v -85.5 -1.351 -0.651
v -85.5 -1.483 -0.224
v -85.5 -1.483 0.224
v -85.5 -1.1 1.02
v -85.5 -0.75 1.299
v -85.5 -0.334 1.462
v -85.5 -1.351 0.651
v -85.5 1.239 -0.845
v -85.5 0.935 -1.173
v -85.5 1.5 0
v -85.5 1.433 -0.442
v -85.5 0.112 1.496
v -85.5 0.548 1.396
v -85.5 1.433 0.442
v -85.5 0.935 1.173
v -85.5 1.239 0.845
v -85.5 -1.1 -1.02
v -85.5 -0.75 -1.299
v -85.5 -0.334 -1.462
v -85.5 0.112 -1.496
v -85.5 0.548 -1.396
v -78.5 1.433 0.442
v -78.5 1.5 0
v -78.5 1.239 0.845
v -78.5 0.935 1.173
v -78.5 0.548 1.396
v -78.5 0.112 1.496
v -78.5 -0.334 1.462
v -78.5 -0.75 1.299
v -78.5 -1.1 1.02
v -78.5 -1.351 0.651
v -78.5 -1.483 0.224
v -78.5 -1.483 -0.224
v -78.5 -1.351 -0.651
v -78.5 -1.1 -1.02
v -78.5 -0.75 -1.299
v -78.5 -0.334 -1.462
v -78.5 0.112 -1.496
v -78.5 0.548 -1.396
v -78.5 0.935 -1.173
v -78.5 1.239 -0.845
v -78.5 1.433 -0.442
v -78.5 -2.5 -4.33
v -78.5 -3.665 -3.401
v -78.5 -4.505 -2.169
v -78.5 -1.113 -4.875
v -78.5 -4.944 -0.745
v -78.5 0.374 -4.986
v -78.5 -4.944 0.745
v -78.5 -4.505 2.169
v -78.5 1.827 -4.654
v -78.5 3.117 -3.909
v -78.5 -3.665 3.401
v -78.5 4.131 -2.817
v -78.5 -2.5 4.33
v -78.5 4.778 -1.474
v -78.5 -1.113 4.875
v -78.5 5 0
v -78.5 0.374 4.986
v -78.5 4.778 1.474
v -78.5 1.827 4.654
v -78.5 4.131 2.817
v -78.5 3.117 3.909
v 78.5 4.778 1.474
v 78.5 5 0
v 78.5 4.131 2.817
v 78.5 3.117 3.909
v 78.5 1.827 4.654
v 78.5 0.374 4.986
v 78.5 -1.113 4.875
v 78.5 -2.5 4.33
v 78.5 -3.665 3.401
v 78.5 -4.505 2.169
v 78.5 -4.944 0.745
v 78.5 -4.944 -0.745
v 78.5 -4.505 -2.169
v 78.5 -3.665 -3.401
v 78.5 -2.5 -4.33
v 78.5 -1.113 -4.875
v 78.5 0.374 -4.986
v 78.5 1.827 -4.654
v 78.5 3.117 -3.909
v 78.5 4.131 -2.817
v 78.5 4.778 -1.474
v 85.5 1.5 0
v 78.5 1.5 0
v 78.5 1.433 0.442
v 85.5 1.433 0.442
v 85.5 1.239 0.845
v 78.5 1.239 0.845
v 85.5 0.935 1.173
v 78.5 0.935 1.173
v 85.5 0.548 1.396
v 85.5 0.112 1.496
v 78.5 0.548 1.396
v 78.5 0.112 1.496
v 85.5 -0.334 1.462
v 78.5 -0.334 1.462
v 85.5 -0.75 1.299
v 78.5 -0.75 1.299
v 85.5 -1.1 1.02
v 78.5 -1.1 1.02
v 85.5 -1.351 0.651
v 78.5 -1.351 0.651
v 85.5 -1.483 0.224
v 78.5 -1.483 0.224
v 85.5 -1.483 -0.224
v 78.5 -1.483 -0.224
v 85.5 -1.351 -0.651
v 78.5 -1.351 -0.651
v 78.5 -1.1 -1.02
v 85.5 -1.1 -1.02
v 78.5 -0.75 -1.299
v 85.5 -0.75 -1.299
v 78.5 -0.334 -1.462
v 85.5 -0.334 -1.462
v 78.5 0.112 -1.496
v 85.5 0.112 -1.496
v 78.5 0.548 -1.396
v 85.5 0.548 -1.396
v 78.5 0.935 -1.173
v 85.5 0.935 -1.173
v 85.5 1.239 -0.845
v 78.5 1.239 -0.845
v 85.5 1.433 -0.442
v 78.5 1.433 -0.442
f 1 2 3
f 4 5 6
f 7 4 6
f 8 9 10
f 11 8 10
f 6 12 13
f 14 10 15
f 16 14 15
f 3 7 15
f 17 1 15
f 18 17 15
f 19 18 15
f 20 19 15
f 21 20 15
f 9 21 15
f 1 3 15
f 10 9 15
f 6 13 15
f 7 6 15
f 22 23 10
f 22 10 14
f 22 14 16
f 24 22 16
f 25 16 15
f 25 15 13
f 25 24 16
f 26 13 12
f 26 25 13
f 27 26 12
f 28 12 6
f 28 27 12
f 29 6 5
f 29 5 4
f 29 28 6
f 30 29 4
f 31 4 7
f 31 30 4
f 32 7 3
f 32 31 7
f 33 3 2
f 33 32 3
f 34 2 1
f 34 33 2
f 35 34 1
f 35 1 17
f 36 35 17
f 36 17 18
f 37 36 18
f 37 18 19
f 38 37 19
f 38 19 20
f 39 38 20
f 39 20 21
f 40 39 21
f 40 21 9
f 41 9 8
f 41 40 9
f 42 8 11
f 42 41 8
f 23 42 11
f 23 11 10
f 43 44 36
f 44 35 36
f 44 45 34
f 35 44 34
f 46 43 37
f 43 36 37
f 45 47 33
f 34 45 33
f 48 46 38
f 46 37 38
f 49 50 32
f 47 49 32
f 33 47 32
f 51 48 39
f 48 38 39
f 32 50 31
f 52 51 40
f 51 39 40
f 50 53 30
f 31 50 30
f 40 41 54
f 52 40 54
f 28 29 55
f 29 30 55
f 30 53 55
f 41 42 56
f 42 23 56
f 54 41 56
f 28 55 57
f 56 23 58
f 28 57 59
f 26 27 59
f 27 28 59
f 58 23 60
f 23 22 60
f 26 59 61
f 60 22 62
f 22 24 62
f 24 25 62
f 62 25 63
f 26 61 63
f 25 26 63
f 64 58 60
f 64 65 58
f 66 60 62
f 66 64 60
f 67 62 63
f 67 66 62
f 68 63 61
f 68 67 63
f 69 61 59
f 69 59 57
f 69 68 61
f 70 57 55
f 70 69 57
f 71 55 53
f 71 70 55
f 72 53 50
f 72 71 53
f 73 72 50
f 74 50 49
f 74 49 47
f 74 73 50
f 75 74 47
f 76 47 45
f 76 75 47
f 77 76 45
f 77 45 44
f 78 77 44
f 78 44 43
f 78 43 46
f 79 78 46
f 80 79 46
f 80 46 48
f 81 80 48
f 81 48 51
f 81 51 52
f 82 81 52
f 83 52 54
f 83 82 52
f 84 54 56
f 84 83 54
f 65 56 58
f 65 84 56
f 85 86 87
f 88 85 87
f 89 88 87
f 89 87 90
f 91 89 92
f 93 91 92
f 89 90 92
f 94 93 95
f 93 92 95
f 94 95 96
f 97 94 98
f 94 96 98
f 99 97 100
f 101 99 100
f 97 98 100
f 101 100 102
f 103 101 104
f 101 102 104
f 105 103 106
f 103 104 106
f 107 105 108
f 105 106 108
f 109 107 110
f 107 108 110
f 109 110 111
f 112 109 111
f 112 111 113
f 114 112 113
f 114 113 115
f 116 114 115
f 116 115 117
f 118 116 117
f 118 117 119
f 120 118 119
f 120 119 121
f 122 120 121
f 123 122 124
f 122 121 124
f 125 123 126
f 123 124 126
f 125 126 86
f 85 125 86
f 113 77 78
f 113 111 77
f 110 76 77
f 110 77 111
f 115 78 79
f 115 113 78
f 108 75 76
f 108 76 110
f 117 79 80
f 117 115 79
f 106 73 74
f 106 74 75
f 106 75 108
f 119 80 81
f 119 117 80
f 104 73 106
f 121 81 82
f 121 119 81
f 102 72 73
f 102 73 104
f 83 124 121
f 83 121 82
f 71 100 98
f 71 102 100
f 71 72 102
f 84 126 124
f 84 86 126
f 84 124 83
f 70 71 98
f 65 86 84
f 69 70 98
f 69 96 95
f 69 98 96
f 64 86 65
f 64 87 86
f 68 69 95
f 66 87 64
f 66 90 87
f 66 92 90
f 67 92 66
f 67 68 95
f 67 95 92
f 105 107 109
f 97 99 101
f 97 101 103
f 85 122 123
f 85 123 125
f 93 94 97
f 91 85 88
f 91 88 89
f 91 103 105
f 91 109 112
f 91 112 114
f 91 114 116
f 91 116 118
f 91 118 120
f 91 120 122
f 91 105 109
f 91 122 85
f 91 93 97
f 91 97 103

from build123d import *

# Parameters (mm, degrees)
F0_R     = 5
F1_DEPTH = 78.5
F2_R     = 1.5
F3_DEPTH = 7


with BuildPart() as f1:
    # F0 (on Right) → F1 (new body)
    with BuildSketch(Plane.YZ):
        Circle(F0_R)
    extrude(amount=F1_DEPTH)

    # F2 (on face) → F3 (join)
    with BuildSketch(Plane.YZ.offset(78.5)):
        Circle(F2_R)
    extrude(amount=F3_DEPTH)

    # F4: F1 across plane


with BuildPart() as f1_1:
    add(f1.part)
    add(f1.part.mirror(Plane.YZ))


solid = f1_1.part
